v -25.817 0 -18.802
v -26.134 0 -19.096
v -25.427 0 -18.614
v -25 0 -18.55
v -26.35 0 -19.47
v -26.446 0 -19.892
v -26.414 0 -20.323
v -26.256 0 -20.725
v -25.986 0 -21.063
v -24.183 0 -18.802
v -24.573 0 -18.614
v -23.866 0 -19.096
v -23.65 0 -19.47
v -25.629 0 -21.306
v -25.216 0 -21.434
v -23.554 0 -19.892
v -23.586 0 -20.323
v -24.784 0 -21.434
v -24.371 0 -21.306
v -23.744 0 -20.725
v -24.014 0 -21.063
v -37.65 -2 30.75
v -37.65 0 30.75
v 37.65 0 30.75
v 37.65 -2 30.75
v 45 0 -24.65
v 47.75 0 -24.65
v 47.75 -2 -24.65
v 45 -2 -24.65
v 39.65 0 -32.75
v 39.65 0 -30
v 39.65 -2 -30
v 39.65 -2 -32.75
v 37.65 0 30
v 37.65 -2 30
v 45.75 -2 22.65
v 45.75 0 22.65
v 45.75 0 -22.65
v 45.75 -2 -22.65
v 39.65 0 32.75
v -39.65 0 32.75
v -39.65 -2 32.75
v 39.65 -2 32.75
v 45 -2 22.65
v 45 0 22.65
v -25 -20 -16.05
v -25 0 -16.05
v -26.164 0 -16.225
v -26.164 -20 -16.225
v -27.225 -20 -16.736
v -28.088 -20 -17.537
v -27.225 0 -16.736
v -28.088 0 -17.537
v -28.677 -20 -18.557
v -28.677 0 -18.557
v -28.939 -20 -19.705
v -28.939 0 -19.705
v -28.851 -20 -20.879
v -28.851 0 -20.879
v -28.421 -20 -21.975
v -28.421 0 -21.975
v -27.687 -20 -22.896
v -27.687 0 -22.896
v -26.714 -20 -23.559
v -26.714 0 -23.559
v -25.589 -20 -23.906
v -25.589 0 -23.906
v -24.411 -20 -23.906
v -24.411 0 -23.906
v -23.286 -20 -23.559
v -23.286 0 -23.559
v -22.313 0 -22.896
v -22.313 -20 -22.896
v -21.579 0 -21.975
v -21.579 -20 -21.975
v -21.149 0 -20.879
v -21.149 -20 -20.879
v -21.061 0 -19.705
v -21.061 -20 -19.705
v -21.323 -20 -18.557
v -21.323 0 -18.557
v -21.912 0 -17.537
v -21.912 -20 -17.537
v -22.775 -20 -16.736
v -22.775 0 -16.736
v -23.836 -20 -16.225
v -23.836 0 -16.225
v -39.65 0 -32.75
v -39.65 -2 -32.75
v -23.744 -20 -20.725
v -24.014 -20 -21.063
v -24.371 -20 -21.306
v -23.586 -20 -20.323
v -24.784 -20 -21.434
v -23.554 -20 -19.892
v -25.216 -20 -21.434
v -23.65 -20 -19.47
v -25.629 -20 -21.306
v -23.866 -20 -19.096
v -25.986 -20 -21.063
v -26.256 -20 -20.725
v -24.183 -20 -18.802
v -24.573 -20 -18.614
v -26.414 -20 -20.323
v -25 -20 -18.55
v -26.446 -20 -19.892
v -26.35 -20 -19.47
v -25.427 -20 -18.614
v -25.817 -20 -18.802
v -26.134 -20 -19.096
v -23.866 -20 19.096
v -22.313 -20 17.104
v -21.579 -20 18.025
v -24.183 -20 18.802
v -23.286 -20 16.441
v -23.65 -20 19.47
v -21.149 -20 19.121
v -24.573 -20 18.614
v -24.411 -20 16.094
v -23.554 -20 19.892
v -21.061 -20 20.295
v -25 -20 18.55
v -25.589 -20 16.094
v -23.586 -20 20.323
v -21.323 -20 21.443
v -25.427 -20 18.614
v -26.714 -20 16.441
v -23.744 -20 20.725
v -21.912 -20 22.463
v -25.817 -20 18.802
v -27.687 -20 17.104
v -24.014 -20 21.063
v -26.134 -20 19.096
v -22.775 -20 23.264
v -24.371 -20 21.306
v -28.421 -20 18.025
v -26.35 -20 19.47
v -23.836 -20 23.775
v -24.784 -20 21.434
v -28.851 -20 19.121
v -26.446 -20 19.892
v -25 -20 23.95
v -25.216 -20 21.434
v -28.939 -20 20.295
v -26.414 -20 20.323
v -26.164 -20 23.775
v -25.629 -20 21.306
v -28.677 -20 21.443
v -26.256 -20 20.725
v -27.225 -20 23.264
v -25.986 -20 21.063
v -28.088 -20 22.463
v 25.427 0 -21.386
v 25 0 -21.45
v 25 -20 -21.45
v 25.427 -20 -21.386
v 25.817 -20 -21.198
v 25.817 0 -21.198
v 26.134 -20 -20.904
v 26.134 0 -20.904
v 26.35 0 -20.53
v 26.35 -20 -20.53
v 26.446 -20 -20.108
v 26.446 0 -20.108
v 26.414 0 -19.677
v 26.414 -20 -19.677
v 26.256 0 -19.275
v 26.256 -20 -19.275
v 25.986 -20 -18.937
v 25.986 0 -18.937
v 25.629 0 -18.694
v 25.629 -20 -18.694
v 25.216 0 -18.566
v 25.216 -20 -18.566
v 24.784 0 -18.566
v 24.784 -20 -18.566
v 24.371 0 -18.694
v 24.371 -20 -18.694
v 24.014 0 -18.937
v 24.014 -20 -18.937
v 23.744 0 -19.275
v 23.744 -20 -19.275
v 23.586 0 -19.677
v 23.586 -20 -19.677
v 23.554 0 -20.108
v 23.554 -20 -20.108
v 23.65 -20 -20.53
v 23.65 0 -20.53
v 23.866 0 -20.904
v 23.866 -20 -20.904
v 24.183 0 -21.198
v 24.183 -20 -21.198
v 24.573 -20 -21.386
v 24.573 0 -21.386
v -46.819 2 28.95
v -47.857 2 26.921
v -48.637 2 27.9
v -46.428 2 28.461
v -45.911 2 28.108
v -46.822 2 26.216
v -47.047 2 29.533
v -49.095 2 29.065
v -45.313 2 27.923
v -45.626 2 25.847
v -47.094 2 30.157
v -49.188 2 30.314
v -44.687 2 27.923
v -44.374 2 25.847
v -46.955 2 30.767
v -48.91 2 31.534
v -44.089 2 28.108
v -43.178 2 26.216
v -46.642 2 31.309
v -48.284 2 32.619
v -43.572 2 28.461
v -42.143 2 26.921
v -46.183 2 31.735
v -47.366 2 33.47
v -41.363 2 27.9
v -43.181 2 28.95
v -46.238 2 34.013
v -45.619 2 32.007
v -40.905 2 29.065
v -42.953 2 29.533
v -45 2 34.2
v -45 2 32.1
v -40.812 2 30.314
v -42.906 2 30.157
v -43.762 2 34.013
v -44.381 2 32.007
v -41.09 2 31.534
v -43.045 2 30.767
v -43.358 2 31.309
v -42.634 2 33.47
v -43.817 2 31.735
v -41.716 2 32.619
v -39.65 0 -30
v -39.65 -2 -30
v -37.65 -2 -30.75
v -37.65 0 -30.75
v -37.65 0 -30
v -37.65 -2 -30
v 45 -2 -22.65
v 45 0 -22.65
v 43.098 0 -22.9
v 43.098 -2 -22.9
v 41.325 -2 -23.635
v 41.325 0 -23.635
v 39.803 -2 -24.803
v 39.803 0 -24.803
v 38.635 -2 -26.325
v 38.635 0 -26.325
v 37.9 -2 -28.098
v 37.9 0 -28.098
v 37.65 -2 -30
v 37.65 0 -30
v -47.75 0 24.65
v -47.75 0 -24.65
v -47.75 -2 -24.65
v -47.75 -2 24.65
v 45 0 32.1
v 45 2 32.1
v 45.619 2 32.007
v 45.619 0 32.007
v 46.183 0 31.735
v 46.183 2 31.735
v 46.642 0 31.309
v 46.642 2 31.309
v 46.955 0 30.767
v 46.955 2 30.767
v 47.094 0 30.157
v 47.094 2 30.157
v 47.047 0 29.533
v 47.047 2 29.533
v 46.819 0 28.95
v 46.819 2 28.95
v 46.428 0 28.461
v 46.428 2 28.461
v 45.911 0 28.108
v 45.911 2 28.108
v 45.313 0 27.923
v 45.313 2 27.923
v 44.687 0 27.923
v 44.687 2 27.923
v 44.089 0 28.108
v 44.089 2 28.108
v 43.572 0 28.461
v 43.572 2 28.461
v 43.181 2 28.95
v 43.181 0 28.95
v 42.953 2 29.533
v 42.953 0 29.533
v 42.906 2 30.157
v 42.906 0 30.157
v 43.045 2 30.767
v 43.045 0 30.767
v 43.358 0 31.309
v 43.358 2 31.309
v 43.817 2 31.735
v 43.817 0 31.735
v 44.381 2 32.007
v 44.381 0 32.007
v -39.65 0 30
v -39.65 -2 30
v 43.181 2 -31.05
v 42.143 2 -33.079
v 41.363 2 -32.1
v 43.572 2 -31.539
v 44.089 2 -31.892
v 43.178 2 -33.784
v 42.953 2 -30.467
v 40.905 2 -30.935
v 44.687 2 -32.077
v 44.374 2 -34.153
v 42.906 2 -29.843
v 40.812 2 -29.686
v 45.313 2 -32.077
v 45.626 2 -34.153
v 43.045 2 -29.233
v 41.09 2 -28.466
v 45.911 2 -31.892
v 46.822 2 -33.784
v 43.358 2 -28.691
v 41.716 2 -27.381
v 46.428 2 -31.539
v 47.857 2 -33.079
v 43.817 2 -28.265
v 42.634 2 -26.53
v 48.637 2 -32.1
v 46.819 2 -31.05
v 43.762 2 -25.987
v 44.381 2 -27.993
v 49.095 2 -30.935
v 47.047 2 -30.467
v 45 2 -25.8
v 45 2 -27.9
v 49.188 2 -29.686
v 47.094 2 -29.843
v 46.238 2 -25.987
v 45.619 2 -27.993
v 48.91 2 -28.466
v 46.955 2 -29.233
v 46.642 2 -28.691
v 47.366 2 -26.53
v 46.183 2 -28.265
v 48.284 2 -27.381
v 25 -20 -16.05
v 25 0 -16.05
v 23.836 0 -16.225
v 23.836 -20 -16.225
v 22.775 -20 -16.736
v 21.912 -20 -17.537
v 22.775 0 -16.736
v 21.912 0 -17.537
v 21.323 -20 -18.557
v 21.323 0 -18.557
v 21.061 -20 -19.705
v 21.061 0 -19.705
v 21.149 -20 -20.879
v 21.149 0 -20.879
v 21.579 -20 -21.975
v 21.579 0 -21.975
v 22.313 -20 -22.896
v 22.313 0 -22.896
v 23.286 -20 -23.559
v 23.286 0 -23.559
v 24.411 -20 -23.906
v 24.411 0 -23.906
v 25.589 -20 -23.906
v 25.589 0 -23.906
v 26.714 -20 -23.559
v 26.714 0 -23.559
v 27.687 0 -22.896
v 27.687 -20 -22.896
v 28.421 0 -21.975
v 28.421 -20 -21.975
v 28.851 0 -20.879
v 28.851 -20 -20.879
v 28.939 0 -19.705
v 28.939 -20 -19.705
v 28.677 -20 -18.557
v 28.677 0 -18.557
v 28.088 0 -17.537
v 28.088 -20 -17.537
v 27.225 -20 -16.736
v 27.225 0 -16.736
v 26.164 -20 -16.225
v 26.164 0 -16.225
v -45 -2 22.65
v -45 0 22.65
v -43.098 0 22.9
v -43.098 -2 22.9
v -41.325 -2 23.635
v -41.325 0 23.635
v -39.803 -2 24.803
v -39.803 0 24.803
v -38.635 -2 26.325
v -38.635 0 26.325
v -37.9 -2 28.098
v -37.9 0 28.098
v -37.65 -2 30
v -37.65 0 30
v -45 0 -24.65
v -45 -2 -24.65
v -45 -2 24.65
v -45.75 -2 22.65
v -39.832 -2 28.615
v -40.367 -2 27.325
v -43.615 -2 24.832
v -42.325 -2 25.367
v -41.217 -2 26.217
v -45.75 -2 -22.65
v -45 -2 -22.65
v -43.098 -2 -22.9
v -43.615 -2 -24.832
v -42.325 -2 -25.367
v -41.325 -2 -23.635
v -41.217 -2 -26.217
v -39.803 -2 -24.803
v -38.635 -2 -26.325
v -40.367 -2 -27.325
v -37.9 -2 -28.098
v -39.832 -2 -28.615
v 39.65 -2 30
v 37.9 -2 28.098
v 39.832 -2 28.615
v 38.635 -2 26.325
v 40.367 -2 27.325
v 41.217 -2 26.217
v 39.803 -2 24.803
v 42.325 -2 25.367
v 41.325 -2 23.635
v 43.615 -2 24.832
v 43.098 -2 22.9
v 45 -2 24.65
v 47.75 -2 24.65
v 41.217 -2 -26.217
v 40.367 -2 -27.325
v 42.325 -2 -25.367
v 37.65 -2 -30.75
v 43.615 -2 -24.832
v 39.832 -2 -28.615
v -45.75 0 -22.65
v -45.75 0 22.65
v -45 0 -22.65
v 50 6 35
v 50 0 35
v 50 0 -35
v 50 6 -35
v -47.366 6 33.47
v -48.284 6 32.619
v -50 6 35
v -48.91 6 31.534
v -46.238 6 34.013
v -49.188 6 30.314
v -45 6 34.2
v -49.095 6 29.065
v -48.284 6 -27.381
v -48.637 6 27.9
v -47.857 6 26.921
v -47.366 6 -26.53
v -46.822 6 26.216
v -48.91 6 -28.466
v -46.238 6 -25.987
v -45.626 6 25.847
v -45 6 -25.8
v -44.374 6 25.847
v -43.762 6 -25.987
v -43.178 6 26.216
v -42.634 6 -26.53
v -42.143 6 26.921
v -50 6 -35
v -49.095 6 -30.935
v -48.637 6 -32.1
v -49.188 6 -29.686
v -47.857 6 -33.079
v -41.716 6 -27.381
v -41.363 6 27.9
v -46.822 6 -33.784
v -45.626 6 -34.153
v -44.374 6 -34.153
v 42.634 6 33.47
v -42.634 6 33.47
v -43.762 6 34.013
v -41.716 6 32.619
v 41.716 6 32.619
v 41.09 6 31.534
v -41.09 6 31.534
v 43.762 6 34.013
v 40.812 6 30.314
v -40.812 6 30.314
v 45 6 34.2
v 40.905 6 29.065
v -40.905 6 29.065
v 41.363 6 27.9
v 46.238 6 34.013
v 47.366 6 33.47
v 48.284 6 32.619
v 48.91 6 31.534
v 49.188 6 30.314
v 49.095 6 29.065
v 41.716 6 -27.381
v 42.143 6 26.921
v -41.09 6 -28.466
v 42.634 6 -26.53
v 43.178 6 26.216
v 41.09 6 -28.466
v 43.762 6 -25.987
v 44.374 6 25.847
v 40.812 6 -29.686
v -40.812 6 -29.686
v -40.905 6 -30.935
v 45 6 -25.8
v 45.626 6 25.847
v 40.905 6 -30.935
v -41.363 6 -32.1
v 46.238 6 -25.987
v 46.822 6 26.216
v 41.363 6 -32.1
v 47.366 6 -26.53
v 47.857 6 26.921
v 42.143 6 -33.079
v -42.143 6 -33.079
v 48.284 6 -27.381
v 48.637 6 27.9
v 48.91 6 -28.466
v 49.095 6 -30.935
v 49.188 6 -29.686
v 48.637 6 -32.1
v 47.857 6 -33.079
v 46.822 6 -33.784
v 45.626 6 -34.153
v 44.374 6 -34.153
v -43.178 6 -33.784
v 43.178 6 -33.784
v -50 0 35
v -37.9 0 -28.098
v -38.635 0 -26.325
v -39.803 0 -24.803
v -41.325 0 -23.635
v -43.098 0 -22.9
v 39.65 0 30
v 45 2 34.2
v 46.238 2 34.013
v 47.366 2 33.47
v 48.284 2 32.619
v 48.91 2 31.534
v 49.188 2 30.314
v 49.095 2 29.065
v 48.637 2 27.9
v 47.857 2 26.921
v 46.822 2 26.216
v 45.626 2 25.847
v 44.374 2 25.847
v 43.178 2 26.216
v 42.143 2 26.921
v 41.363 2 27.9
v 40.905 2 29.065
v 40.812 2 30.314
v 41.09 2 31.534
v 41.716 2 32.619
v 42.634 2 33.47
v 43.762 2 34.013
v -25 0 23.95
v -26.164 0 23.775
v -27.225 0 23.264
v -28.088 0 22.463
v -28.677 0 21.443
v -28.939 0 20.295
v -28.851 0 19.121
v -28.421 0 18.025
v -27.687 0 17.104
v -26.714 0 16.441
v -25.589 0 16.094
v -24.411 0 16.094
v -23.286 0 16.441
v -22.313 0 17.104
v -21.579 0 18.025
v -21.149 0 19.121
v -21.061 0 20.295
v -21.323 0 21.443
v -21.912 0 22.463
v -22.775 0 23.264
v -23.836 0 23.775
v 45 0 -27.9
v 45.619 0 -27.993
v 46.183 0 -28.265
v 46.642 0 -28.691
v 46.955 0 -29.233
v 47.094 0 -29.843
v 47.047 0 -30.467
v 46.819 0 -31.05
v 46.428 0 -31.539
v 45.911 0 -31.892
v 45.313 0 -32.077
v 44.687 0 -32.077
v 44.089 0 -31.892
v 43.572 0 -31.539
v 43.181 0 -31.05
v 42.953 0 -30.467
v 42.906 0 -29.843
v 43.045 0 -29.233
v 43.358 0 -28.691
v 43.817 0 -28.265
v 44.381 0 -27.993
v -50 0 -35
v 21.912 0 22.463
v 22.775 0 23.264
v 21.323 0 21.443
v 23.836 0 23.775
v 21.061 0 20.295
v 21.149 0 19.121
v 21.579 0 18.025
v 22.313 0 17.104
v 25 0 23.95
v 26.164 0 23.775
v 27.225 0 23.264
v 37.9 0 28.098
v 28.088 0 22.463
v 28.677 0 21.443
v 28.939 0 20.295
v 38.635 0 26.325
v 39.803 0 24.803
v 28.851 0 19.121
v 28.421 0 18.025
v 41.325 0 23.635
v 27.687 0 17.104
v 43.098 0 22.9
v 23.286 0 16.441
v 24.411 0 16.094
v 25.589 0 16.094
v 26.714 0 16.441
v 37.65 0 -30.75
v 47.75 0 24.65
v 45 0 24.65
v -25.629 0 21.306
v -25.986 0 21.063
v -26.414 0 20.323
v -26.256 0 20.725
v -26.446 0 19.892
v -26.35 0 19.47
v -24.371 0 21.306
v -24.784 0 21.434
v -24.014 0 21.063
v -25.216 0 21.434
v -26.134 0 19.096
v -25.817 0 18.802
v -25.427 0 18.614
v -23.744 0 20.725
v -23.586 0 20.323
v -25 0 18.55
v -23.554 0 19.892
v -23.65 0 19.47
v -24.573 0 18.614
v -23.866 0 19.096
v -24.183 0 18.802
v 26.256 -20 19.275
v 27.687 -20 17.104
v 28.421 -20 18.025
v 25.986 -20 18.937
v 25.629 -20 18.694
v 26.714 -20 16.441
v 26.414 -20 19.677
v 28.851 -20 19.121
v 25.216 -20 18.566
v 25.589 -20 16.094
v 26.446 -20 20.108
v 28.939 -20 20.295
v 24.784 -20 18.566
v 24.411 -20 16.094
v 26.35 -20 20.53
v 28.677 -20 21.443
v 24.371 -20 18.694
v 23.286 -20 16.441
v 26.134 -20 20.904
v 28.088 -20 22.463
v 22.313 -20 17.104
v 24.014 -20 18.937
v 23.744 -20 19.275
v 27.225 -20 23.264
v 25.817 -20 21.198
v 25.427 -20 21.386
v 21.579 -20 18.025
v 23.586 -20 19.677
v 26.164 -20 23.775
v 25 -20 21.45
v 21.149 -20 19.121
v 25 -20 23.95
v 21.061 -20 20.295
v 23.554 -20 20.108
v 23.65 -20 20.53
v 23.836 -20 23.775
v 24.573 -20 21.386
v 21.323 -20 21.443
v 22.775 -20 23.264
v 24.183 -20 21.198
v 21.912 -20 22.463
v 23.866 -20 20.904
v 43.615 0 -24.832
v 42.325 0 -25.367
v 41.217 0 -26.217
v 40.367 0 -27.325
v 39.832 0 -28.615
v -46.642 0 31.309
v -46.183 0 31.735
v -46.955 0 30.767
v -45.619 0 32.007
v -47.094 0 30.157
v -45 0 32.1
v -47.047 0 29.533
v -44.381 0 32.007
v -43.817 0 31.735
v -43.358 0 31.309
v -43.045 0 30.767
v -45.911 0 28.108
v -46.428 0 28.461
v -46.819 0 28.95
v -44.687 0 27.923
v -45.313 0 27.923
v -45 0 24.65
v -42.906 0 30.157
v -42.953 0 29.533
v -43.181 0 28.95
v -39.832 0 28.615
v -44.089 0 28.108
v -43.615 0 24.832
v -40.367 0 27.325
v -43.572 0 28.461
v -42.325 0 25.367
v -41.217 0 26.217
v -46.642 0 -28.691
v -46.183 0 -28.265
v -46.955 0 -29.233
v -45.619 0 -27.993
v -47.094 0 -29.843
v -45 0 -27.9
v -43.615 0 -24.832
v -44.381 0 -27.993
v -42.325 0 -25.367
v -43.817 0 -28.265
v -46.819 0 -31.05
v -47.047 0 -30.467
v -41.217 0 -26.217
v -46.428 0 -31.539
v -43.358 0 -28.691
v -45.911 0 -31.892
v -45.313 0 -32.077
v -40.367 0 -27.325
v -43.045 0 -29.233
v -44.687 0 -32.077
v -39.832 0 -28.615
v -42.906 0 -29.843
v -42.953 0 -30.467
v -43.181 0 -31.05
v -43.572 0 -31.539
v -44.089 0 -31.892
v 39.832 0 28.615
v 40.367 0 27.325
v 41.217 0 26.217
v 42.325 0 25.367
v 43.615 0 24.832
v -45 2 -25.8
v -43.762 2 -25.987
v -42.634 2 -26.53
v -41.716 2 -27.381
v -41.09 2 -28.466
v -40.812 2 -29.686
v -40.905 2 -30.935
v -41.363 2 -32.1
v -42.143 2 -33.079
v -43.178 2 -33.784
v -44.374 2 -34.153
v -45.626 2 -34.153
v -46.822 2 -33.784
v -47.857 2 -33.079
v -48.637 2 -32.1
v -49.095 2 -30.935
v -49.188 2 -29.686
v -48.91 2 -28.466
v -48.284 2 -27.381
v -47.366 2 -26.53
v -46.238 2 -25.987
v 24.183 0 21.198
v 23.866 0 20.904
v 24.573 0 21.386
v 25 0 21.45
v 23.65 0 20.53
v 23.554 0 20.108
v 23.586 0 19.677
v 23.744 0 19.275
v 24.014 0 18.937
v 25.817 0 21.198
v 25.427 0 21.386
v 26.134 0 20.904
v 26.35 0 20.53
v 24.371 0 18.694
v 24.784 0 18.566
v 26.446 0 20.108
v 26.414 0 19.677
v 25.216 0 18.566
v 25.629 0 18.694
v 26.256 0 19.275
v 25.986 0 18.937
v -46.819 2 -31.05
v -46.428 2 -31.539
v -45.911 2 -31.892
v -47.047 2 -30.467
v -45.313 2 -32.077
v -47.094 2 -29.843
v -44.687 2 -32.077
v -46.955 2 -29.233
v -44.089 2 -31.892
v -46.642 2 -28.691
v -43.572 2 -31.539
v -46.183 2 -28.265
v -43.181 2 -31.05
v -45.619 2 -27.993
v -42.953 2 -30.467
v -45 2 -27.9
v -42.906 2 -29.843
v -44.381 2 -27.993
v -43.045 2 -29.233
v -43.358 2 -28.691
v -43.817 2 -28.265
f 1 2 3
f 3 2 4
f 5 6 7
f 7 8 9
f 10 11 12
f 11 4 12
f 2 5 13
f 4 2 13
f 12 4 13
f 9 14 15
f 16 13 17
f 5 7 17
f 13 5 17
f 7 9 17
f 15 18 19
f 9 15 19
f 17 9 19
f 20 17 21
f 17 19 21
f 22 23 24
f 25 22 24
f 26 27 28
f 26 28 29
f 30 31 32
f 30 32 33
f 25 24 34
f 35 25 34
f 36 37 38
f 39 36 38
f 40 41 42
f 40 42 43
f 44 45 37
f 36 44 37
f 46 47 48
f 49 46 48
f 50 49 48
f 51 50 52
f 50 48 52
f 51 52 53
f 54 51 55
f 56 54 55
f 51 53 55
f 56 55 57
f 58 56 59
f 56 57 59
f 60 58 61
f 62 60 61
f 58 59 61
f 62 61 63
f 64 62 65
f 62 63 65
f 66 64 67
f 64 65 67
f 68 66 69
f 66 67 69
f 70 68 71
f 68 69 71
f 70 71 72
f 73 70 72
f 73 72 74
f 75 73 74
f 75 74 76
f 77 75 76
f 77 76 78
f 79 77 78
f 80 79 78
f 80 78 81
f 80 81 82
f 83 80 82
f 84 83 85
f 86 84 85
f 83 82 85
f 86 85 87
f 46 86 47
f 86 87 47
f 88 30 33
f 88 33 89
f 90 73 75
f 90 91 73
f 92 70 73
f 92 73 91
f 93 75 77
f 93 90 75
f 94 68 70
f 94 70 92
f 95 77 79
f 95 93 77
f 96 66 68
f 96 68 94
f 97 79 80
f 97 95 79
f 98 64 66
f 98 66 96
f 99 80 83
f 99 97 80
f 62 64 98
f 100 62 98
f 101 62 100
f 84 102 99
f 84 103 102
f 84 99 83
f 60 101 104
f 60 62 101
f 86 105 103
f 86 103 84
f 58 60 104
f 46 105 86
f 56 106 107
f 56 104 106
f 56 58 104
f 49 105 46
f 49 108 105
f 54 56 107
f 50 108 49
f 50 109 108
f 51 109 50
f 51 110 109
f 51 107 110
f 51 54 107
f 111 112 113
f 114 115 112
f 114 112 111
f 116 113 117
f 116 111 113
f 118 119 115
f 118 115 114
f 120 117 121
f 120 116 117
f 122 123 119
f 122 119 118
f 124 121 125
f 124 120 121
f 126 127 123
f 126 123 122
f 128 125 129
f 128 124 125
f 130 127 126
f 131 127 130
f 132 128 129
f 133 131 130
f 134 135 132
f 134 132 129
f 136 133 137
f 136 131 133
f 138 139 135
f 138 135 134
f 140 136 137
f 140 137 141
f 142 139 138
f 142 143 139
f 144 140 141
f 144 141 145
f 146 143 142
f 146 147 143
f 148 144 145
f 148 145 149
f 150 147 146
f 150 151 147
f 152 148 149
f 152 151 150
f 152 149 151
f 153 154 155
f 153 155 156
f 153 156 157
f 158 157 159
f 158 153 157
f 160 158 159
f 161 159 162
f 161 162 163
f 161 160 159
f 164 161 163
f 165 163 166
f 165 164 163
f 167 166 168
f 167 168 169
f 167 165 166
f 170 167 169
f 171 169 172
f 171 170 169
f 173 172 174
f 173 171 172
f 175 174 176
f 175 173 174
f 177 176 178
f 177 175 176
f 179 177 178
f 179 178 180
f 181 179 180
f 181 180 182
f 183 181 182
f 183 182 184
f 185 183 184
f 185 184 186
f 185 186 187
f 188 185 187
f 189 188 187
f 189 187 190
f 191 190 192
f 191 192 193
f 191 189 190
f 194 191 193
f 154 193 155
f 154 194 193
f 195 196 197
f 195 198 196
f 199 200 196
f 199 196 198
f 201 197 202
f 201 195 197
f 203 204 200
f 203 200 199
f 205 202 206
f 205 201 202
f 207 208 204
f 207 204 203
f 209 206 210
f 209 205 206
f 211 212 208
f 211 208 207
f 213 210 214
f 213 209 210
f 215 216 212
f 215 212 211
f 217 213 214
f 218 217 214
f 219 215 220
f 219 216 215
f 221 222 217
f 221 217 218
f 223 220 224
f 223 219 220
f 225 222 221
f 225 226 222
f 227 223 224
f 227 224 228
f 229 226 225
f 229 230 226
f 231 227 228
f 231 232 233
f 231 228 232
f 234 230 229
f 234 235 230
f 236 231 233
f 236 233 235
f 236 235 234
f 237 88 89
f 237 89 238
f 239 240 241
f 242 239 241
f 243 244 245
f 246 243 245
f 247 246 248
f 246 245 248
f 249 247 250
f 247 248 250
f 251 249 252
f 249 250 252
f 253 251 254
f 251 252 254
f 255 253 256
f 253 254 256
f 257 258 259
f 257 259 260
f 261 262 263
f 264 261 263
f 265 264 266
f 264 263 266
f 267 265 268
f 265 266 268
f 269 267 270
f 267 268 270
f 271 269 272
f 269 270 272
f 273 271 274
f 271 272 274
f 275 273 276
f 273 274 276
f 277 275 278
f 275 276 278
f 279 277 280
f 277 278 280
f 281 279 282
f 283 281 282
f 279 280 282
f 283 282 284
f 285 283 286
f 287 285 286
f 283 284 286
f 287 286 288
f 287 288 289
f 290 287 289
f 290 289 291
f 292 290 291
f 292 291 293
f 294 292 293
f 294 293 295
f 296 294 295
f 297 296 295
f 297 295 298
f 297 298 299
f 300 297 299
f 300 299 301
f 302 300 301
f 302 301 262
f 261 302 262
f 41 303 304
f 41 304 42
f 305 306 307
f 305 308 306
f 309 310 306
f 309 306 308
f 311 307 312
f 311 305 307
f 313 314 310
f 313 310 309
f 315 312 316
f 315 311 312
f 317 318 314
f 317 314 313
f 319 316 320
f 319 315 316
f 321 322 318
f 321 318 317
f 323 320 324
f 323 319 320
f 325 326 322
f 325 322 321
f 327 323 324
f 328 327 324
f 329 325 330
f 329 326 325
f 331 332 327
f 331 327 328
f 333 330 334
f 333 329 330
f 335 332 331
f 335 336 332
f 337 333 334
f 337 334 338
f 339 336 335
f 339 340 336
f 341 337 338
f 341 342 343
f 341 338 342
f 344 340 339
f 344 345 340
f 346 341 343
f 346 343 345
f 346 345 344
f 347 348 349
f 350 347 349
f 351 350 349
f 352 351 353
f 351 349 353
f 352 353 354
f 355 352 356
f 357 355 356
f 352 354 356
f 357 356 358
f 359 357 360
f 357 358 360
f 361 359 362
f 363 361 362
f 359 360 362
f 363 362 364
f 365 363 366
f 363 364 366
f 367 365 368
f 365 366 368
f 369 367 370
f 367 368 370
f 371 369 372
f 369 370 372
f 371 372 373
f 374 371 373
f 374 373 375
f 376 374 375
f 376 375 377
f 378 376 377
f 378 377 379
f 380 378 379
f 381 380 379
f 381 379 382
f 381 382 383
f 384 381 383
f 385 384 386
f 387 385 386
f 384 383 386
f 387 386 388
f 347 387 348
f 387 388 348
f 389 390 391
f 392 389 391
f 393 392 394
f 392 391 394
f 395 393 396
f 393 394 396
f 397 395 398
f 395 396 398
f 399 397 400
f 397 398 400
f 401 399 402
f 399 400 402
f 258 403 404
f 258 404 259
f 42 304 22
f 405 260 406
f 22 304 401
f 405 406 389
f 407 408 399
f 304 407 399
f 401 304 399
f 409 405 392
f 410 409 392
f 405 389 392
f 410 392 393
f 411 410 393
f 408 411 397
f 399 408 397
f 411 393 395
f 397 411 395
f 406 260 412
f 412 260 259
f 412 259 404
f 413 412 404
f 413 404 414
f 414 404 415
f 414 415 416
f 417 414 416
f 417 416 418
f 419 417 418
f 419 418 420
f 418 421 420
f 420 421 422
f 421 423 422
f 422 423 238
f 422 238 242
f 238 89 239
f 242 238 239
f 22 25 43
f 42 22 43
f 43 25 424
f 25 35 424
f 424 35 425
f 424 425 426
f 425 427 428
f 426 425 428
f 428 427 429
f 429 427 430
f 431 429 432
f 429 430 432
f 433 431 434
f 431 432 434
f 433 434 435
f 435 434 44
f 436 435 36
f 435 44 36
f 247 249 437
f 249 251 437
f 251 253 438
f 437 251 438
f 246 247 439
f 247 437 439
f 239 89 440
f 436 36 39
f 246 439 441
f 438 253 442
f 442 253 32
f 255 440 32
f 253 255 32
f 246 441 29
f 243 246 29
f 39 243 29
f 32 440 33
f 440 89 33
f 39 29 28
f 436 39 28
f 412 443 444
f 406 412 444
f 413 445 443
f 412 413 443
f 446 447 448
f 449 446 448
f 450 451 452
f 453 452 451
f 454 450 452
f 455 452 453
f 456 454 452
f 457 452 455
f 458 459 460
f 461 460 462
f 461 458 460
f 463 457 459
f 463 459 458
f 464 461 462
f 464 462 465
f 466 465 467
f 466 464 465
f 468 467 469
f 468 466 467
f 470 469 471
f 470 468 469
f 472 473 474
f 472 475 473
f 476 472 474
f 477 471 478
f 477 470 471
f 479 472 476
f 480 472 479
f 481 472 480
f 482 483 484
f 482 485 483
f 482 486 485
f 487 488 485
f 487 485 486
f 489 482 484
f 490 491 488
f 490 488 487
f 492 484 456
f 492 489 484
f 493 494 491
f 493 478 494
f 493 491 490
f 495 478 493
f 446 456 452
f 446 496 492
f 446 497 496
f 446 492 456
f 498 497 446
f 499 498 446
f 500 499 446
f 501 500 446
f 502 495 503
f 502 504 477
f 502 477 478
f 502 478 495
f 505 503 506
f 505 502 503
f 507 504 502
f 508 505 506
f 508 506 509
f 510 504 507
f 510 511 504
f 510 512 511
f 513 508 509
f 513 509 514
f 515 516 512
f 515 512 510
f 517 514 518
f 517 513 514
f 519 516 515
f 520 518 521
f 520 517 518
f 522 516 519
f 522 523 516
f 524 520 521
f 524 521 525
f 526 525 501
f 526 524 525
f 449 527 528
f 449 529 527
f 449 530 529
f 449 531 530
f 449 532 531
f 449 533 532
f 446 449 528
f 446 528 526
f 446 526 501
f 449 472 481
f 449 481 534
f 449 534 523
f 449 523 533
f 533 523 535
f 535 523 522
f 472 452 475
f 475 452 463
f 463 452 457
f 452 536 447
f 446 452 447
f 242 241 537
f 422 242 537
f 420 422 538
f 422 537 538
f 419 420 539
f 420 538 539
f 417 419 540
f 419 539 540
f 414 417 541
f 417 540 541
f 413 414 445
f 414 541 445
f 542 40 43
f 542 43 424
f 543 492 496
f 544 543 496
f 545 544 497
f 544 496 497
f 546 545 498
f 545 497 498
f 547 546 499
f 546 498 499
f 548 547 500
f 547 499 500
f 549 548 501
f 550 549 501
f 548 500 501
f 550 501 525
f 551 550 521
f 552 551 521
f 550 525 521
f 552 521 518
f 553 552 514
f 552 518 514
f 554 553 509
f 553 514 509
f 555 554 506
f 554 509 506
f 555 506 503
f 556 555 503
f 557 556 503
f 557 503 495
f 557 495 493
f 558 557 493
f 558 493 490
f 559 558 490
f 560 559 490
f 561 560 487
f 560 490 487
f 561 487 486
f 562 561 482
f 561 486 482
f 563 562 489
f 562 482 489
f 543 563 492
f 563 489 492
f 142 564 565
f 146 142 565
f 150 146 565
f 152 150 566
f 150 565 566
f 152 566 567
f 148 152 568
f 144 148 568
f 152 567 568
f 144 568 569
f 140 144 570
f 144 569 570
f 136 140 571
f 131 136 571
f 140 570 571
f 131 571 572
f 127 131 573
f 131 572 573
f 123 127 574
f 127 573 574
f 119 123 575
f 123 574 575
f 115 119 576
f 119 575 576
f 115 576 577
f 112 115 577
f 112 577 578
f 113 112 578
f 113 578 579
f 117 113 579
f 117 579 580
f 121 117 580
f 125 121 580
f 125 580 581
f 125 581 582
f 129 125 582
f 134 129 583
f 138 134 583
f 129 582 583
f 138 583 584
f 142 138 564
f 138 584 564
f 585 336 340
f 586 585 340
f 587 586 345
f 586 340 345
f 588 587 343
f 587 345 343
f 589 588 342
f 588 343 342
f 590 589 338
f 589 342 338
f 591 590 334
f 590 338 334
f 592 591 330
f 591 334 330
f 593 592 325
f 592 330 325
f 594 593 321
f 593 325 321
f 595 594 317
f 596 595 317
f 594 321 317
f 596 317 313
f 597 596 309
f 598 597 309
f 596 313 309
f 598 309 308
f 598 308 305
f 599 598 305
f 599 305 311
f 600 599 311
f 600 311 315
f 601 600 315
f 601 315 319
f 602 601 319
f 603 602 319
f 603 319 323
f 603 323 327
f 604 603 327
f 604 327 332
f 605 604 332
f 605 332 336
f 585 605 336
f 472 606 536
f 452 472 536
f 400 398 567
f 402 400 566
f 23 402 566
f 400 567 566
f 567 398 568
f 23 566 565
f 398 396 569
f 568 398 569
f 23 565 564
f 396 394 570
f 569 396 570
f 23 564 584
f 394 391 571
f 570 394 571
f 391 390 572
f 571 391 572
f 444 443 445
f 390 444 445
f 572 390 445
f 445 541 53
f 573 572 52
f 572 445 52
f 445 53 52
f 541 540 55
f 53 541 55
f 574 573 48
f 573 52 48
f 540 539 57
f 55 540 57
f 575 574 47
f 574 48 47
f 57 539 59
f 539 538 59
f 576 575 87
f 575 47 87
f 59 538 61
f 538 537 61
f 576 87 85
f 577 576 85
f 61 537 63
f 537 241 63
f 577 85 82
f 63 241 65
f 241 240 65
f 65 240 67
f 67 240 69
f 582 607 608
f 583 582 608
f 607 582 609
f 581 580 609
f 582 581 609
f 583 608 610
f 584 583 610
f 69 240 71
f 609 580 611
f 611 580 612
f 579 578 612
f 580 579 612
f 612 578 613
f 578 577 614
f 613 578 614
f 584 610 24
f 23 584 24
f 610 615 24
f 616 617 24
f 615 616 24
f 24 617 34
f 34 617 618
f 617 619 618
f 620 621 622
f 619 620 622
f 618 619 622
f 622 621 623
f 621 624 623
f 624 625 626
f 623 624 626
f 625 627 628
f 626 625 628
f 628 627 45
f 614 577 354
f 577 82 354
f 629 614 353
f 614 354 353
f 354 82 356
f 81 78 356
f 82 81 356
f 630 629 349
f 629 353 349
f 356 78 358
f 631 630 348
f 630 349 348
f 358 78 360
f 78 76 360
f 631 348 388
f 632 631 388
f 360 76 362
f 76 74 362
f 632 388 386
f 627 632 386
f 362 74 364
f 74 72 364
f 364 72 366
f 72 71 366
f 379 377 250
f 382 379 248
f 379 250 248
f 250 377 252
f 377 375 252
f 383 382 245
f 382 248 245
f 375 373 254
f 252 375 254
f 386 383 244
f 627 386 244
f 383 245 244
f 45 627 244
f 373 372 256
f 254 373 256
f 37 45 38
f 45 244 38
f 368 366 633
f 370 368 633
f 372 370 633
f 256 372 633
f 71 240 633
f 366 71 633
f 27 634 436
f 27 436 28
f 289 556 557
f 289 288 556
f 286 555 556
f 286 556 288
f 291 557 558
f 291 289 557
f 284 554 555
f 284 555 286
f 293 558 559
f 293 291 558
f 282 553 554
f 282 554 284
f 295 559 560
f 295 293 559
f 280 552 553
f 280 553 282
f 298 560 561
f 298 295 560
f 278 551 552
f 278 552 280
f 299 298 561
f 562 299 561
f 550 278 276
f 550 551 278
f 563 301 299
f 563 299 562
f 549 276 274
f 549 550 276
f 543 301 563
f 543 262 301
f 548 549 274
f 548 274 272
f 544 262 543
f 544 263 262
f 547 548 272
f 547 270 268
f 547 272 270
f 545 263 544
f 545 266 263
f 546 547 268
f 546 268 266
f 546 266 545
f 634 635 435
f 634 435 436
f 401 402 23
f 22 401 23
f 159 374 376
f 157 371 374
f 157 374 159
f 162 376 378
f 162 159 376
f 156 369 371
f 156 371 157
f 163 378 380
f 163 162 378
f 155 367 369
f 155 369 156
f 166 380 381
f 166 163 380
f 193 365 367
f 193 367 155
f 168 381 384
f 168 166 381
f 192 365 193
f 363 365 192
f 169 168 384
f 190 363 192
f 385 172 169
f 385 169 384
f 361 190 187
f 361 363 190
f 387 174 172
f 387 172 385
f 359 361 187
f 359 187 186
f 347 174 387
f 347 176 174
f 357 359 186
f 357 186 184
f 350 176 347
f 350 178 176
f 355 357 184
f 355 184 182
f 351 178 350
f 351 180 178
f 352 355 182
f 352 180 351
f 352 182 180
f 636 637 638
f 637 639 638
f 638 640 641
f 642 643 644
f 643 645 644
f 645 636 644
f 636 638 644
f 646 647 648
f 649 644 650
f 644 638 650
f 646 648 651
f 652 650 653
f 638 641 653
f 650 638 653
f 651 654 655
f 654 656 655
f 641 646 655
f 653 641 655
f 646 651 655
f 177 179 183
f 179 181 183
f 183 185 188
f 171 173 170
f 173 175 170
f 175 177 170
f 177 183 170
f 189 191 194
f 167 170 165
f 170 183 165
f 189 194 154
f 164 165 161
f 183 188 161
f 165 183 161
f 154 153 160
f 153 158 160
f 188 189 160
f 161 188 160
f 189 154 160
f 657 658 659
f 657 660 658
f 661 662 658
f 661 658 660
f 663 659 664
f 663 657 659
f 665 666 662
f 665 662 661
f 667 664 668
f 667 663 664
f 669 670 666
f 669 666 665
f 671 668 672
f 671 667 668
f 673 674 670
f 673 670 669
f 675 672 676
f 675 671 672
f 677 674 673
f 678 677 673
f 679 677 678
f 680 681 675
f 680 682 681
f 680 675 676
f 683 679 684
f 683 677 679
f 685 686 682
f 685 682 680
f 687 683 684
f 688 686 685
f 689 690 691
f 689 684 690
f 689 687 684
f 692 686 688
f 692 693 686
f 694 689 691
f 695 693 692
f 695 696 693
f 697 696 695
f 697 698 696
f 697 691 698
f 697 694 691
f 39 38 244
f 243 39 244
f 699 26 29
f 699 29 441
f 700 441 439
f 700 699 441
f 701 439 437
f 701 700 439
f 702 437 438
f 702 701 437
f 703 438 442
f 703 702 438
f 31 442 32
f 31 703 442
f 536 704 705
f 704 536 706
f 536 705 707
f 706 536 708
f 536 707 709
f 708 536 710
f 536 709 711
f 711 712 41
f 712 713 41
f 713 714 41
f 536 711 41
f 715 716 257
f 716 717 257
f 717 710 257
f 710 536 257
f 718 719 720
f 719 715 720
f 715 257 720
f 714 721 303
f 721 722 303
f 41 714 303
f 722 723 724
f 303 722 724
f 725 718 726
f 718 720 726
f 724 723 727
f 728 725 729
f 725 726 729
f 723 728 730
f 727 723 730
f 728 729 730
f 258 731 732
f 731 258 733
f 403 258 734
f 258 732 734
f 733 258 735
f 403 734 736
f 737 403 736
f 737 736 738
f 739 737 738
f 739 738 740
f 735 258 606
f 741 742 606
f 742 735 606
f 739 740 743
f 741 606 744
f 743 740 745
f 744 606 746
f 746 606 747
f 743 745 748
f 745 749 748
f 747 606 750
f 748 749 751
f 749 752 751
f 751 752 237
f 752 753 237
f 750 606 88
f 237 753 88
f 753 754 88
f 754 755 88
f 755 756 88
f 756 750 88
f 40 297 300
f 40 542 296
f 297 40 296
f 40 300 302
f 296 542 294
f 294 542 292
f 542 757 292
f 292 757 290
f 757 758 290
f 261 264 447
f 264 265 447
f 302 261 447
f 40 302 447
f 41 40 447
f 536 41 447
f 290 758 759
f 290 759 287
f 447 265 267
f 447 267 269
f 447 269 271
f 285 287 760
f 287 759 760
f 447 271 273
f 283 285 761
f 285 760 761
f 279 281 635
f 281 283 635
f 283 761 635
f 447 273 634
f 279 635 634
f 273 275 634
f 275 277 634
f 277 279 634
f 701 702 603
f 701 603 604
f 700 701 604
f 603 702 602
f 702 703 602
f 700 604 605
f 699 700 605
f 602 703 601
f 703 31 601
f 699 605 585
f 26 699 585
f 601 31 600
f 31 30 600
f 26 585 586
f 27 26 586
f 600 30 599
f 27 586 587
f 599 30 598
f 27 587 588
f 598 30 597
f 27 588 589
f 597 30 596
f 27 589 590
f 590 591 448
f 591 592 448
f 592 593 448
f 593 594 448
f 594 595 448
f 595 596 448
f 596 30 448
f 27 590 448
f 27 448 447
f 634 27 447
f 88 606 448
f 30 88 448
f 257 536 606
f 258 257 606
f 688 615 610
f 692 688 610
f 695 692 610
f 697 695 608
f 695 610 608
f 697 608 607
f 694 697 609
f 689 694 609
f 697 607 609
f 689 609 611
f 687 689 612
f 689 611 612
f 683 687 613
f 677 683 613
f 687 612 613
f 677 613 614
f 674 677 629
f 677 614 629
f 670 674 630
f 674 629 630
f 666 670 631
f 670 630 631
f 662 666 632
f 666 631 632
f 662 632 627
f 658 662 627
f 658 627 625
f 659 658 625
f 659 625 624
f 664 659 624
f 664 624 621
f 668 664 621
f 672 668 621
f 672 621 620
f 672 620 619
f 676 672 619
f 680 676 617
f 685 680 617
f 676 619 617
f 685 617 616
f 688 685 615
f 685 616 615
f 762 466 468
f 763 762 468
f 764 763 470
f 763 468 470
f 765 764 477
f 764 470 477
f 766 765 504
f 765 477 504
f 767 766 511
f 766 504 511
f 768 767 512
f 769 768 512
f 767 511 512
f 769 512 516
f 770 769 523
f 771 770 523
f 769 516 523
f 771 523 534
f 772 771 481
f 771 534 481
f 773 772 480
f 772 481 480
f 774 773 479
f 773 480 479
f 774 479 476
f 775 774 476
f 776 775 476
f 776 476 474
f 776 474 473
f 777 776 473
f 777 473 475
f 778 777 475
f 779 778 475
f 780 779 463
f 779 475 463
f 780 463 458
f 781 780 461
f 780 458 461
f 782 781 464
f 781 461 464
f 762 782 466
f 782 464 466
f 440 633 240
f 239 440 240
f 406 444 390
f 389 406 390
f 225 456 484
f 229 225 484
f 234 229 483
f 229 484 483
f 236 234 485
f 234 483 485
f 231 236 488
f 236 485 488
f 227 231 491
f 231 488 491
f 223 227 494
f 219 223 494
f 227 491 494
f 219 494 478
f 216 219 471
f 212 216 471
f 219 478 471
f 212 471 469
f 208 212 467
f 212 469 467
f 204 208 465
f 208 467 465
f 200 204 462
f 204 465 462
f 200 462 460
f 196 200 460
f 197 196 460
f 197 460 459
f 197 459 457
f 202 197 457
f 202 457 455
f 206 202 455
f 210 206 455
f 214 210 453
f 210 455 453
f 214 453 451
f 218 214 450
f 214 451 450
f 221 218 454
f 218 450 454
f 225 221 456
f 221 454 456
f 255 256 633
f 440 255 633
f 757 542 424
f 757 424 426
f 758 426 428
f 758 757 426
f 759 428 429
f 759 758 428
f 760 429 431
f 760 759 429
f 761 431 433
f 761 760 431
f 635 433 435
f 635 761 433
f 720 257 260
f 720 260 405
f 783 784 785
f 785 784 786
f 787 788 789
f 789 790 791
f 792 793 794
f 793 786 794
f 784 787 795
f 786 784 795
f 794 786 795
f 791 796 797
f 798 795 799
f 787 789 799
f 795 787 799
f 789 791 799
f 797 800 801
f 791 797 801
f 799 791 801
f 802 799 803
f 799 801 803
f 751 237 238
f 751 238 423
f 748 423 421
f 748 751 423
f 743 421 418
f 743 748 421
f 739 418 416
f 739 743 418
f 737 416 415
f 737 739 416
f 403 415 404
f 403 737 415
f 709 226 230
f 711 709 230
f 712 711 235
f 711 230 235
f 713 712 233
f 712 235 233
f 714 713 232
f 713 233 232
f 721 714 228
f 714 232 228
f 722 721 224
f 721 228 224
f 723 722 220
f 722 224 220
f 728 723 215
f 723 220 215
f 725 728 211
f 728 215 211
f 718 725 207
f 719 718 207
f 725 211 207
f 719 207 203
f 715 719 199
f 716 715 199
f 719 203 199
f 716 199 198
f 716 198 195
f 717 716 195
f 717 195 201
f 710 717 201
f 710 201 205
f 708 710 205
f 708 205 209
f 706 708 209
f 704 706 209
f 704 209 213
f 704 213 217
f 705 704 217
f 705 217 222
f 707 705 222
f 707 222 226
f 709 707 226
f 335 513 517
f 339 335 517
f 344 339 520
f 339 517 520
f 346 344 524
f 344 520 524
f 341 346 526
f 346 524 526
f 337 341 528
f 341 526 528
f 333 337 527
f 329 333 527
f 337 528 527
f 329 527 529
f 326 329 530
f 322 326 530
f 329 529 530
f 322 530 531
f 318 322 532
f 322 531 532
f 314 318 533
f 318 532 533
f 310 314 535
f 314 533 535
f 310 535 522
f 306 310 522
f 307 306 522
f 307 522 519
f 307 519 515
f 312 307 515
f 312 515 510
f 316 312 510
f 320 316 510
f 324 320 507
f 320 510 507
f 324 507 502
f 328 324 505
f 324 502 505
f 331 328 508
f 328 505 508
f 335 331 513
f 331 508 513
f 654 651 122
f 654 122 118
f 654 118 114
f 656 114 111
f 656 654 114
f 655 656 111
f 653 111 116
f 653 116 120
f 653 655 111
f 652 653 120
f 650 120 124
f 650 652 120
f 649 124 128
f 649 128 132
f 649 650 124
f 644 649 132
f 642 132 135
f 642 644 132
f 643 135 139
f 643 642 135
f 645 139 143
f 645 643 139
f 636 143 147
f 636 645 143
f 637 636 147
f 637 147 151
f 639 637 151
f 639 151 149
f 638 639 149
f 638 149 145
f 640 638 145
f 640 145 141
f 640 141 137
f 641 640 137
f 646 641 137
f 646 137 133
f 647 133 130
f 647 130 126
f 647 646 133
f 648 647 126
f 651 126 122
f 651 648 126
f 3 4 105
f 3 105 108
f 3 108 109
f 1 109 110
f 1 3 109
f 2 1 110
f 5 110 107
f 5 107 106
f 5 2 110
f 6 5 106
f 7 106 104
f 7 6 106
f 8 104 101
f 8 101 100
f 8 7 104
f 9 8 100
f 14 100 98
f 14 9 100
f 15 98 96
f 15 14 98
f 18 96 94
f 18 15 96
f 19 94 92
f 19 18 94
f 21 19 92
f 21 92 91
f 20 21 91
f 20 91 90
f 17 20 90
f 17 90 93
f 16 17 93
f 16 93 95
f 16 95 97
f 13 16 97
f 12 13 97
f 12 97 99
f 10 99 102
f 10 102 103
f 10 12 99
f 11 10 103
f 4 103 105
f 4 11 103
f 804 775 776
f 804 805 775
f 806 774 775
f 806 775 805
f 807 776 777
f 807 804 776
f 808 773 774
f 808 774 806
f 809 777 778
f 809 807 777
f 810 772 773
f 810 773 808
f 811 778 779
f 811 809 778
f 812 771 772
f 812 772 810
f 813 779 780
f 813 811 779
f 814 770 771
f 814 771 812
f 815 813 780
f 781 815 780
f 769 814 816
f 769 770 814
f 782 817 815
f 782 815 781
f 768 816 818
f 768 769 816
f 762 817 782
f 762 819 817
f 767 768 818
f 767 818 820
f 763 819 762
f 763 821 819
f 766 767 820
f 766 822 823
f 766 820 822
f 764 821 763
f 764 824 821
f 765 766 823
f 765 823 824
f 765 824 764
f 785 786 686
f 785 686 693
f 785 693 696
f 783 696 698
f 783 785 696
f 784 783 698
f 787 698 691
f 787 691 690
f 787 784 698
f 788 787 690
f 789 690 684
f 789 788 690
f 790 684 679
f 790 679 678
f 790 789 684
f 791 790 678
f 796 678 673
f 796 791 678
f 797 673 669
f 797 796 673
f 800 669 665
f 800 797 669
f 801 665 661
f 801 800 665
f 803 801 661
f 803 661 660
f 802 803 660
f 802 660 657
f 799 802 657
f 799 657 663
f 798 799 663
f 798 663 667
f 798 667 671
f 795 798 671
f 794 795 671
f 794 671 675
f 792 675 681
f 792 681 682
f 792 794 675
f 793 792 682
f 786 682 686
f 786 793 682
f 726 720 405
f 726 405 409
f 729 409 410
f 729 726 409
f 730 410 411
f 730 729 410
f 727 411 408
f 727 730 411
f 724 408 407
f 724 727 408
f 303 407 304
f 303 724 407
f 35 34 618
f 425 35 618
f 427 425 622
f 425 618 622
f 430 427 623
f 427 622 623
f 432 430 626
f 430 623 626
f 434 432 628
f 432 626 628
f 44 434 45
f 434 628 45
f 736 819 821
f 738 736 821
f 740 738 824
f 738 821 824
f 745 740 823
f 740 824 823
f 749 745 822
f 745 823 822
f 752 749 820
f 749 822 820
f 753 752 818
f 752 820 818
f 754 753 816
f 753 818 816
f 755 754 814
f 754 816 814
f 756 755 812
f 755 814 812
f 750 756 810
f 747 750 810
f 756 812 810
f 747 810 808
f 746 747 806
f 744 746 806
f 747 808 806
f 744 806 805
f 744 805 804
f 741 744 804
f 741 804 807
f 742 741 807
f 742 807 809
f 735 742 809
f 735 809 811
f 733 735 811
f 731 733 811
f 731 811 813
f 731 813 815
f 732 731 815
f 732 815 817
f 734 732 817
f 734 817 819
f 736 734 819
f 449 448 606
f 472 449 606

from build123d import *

# Parameters (mm, degrees)
AUFSATZ_LINEAR_AUSTRAGEN1_DEPTH = 6
AUFSATZ_LINEAR_AUSTRAGEN2_DEPTH = 2
SKIZZE3_OUTSIDE_W               = 126.466
SKIZZE3_OUTSIDE_H               = 96.466
SKIZZE3_OUTSIDE_W_2             = 100
SKIZZE3_OUTSIDE_H_2             = 70
SKIZZE3_OUTSIDE_R               = 2.1
SCHNITT_LINEAR_AUSTRAGEN1_DEPTH = 6
SKIZZE4_R                       = 4.2
SCHNITT_LINEAR_AUSTRAGEN2_DEPTH = 4
SKIZZE5_R                       = 3.95
SKIZZE5_R_2                     = 1.45
AUFSATZ_LINEAR_AUSTRAGEN3_DEPTH = 20


with BuildPart() as part:
    # Skizze1 → Aufsatz-Linear austragen1 (new body)
    with BuildSketch(Plane(origin=(0, 0, 0), x_dir=(1, 0, 0), z_dir=(0, 1, 0))):
        Polygon((-50, -35), (50, -35), (50, 35), (-15.02457838, 35), (-35.02457838, 35), (-50, 35), align=None)
    extrude(amount=AUFSATZ_LINEAR_AUSTRAGEN1_DEPTH)

    # Skizze2 → Aufsatz-Linear austragen2 (add)
    with BuildSketch(Plane(origin=(0, 0, 0), x_dir=(-1, 0, 0), z_dir=(0, -1, 0))):
        with BuildLine():
            Line((39.65, -32.75), (-39.65, -32.75))
            Line((-39.65, -32.75), (-39.65, -30))
            ThreePointArc((-39.65, -30), (-41.216978721, -26.216978721), (-45, -24.65))
            Line((-45, -24.65), (-47.75, -24.65))
            Line((-47.75, -24.65), (-47.75, 24.65))
            Line((-47.75, 24.65), (-45, 24.65))
            ThreePointArc((-45, 24.65), (-41.216978721, 26.216978721), (-39.65, 30))
            Line((-39.65, 30), (-39.65, 32.75))
            Line((-39.65, 32.75), (39.65, 32.75))
            Line((39.65, 32.75), (39.65, 30))
            ThreePointArc((39.65, 30), (41.216978721, 26.216978721), (45, 24.65))
            Line((45, 24.65), (47.75, 24.65))
            Line((47.75, 24.65), (47.75, -24.65))
            Line((47.75, -24.65), (45, -24.65))
            ThreePointArc((45, -24.65), (41.216978721, -26.216978721), (39.65, -30))
            Line((39.65, -30), (39.65, -32.75))
        make_face()
        with BuildLine():
            Line((45.75, 22.65), (45.75, -22.65))
            Line((45.75, -22.65), (45, -22.65))
            ThreePointArc((45, -22.65), (39.802765158, -24.802765158), (37.65, -30))
            Line((37.65, -30), (37.65, -30.75))
            Line((37.65, -30.75), (-37.65, -30.75))
            Line((-37.65, -30.75), (-37.65, -30))
            ThreePointArc((-37.65, -30), (-39.802765158, -24.802765158), (-45, -22.65))
            Line((-45, -22.65), (-45.75, -22.65))
            Line((-45.75, -22.65), (-45.75, 22.65))
            Line((-45.75, 22.65), (-45, 22.65))
            ThreePointArc((-45, 22.65), (-39.802765158, 24.802765158), (-37.65, 30))
            Line((-37.65, 30), (-37.65, 30.75))
            Line((-37.65, 30.75), (37.65, 30.75))
            Line((37.65, 30.75), (37.65, 30))
            ThreePointArc((37.65, 30), (39.802765158, 24.802765158), (45, 22.65))
            Line((45, 22.65), (45.75, 22.65))
        make_face(mode=Mode.SUBTRACT)
    extrude(amount=AUFSATZ_LINEAR_AUSTRAGEN2_DEPTH)

    # Skizze3 outside → Schnitt-Linear austragen1 (cut)
    # profile 1 of 5: a face of its own
    with BuildSketch(Plane(origin=(0, 6, 0), x_dir=(1, 0, 0), z_dir=(0, 1, 0))):
        Rectangle(SKIZZE3_OUTSIDE_W, SKIZZE3_OUTSIDE_H)
        Rectangle(SKIZZE3_OUTSIDE_W_2, SKIZZE3_OUTSIDE_H_2, mode=Mode.SUBTRACT)
    # profile 2 of 5: a face of its own
    with BuildSketch(Plane(origin=(0, 6, 0), x_dir=(1, 0, 0), z_dir=(0, 1, 0))):
        with Locations(Location((-45, -30, 0), (0, 0, 270))):
            Circle(SKIZZE3_OUTSIDE_R)
    # profile 3 of 5: a face of its own
    with BuildSketch(Plane(origin=(0, 6, 0), x_dir=(1, 0, 0), z_dir=(0, 1, 0))):
        with Locations(Location((-45, 30, 0), (0, 0, 270))):
            Circle(SKIZZE3_OUTSIDE_R)
    # profile 4 of 5: a face of its own
    with BuildSketch(Plane(origin=(0, 6, 0), x_dir=(1, 0, 0), z_dir=(0, 1, 0))):
        with Locations(Location((45, -30, 0), (0, 0, 270))):
            Circle(SKIZZE3_OUTSIDE_R)
    # profile 5 of 5: a face of its own
    with BuildSketch(Plane(origin=(0, 6, 0), x_dir=(1, 0, 0), z_dir=(0, 1, 0))):
        with Locations(Location((45, 30, 0), (0, 0, 270))):
            Circle(SKIZZE3_OUTSIDE_R)
    extrude(amount=-SCHNITT_LINEAR_AUSTRAGEN1_DEPTH, mode=Mode.SUBTRACT)

    # Skizze4 → Schnitt-Linear austragen2 (cut)
    with BuildSketch(Plane(origin=(0, 6, 0), x_dir=(1, 0, 0), z_dir=(0, 1, 0))):
        with Locations(Location((-45, -30, 0), (0, 0, 270))):
            Circle(SKIZZE4_R)
        with Locations(Location((45, -30, 0), (0, 0, 270))):
            Circle(SKIZZE4_R)
        with Locations(Location((45, 30, 0), (0, 0, 270))):
            Circle(SKIZZE4_R)
        with Locations(Location((-45, 30, 0), (0, 0, 270))):
            Circle(SKIZZE4_R)
    extrude(amount=-SCHNITT_LINEAR_AUSTRAGEN2_DEPTH, mode=Mode.SUBTRACT)

    # Skizze5 → Aufsatz-Linear austragen3 (add)
    # profile 1 of 4: a face of its own
    with BuildSketch(Plane(origin=(0, 0, 0), x_dir=(-1, 0, 0), z_dir=(0, -1, 0))):
        with Locations(Location((25, -20, 0), (0, 0, 270))):
            Circle(SKIZZE5_R)
        with Locations(Location((25, -20, 0), (0, 0, 90))):
            Circle(SKIZZE5_R_2, mode=Mode.SUBTRACT)
    # profile 2 of 4: a face of its own
    with BuildSketch(Plane(origin=(0, 0, 0), x_dir=(-1, 0, 0), z_dir=(0, -1, 0))):
        with Locations(Location((-25, -20, 0), (0, 0, 270))):
            Circle(SKIZZE5_R)
        with Locations(Location((-25, -20, 0), (0, 0, 270))):
            Circle(SKIZZE5_R_2, mode=Mode.SUBTRACT)
    # profile 3 of 4: a face of its own
    with BuildSketch(Plane(origin=(0, 0, 0), x_dir=(-1, 0, 0), z_dir=(0, -1, 0))):
        with Locations(Location((-25, 20, 0), (0, 0, 270))):
            Circle(SKIZZE5_R)
        with Locations(Location((-25, 20, 0), (0, 0, 90))):
            Circle(SKIZZE5_R_2, mode=Mode.SUBTRACT)
    # profile 4 of 4: a face of its own
    with BuildSketch(Plane(origin=(0, 0, 0), x_dir=(-1, 0, 0), z_dir=(0, -1, 0))):
        with Locations(Location((25, 20, 0), (0, 0, 270))):
            Circle(SKIZZE5_R)
        with Locations(Location((25, 20, 0), (0, 0, 270))):
            Circle(SKIZZE5_R_2, mode=Mode.SUBTRACT)
    extrude(amount=AUFSATZ_LINEAR_AUSTRAGEN3_DEPTH)


solid = part.part
